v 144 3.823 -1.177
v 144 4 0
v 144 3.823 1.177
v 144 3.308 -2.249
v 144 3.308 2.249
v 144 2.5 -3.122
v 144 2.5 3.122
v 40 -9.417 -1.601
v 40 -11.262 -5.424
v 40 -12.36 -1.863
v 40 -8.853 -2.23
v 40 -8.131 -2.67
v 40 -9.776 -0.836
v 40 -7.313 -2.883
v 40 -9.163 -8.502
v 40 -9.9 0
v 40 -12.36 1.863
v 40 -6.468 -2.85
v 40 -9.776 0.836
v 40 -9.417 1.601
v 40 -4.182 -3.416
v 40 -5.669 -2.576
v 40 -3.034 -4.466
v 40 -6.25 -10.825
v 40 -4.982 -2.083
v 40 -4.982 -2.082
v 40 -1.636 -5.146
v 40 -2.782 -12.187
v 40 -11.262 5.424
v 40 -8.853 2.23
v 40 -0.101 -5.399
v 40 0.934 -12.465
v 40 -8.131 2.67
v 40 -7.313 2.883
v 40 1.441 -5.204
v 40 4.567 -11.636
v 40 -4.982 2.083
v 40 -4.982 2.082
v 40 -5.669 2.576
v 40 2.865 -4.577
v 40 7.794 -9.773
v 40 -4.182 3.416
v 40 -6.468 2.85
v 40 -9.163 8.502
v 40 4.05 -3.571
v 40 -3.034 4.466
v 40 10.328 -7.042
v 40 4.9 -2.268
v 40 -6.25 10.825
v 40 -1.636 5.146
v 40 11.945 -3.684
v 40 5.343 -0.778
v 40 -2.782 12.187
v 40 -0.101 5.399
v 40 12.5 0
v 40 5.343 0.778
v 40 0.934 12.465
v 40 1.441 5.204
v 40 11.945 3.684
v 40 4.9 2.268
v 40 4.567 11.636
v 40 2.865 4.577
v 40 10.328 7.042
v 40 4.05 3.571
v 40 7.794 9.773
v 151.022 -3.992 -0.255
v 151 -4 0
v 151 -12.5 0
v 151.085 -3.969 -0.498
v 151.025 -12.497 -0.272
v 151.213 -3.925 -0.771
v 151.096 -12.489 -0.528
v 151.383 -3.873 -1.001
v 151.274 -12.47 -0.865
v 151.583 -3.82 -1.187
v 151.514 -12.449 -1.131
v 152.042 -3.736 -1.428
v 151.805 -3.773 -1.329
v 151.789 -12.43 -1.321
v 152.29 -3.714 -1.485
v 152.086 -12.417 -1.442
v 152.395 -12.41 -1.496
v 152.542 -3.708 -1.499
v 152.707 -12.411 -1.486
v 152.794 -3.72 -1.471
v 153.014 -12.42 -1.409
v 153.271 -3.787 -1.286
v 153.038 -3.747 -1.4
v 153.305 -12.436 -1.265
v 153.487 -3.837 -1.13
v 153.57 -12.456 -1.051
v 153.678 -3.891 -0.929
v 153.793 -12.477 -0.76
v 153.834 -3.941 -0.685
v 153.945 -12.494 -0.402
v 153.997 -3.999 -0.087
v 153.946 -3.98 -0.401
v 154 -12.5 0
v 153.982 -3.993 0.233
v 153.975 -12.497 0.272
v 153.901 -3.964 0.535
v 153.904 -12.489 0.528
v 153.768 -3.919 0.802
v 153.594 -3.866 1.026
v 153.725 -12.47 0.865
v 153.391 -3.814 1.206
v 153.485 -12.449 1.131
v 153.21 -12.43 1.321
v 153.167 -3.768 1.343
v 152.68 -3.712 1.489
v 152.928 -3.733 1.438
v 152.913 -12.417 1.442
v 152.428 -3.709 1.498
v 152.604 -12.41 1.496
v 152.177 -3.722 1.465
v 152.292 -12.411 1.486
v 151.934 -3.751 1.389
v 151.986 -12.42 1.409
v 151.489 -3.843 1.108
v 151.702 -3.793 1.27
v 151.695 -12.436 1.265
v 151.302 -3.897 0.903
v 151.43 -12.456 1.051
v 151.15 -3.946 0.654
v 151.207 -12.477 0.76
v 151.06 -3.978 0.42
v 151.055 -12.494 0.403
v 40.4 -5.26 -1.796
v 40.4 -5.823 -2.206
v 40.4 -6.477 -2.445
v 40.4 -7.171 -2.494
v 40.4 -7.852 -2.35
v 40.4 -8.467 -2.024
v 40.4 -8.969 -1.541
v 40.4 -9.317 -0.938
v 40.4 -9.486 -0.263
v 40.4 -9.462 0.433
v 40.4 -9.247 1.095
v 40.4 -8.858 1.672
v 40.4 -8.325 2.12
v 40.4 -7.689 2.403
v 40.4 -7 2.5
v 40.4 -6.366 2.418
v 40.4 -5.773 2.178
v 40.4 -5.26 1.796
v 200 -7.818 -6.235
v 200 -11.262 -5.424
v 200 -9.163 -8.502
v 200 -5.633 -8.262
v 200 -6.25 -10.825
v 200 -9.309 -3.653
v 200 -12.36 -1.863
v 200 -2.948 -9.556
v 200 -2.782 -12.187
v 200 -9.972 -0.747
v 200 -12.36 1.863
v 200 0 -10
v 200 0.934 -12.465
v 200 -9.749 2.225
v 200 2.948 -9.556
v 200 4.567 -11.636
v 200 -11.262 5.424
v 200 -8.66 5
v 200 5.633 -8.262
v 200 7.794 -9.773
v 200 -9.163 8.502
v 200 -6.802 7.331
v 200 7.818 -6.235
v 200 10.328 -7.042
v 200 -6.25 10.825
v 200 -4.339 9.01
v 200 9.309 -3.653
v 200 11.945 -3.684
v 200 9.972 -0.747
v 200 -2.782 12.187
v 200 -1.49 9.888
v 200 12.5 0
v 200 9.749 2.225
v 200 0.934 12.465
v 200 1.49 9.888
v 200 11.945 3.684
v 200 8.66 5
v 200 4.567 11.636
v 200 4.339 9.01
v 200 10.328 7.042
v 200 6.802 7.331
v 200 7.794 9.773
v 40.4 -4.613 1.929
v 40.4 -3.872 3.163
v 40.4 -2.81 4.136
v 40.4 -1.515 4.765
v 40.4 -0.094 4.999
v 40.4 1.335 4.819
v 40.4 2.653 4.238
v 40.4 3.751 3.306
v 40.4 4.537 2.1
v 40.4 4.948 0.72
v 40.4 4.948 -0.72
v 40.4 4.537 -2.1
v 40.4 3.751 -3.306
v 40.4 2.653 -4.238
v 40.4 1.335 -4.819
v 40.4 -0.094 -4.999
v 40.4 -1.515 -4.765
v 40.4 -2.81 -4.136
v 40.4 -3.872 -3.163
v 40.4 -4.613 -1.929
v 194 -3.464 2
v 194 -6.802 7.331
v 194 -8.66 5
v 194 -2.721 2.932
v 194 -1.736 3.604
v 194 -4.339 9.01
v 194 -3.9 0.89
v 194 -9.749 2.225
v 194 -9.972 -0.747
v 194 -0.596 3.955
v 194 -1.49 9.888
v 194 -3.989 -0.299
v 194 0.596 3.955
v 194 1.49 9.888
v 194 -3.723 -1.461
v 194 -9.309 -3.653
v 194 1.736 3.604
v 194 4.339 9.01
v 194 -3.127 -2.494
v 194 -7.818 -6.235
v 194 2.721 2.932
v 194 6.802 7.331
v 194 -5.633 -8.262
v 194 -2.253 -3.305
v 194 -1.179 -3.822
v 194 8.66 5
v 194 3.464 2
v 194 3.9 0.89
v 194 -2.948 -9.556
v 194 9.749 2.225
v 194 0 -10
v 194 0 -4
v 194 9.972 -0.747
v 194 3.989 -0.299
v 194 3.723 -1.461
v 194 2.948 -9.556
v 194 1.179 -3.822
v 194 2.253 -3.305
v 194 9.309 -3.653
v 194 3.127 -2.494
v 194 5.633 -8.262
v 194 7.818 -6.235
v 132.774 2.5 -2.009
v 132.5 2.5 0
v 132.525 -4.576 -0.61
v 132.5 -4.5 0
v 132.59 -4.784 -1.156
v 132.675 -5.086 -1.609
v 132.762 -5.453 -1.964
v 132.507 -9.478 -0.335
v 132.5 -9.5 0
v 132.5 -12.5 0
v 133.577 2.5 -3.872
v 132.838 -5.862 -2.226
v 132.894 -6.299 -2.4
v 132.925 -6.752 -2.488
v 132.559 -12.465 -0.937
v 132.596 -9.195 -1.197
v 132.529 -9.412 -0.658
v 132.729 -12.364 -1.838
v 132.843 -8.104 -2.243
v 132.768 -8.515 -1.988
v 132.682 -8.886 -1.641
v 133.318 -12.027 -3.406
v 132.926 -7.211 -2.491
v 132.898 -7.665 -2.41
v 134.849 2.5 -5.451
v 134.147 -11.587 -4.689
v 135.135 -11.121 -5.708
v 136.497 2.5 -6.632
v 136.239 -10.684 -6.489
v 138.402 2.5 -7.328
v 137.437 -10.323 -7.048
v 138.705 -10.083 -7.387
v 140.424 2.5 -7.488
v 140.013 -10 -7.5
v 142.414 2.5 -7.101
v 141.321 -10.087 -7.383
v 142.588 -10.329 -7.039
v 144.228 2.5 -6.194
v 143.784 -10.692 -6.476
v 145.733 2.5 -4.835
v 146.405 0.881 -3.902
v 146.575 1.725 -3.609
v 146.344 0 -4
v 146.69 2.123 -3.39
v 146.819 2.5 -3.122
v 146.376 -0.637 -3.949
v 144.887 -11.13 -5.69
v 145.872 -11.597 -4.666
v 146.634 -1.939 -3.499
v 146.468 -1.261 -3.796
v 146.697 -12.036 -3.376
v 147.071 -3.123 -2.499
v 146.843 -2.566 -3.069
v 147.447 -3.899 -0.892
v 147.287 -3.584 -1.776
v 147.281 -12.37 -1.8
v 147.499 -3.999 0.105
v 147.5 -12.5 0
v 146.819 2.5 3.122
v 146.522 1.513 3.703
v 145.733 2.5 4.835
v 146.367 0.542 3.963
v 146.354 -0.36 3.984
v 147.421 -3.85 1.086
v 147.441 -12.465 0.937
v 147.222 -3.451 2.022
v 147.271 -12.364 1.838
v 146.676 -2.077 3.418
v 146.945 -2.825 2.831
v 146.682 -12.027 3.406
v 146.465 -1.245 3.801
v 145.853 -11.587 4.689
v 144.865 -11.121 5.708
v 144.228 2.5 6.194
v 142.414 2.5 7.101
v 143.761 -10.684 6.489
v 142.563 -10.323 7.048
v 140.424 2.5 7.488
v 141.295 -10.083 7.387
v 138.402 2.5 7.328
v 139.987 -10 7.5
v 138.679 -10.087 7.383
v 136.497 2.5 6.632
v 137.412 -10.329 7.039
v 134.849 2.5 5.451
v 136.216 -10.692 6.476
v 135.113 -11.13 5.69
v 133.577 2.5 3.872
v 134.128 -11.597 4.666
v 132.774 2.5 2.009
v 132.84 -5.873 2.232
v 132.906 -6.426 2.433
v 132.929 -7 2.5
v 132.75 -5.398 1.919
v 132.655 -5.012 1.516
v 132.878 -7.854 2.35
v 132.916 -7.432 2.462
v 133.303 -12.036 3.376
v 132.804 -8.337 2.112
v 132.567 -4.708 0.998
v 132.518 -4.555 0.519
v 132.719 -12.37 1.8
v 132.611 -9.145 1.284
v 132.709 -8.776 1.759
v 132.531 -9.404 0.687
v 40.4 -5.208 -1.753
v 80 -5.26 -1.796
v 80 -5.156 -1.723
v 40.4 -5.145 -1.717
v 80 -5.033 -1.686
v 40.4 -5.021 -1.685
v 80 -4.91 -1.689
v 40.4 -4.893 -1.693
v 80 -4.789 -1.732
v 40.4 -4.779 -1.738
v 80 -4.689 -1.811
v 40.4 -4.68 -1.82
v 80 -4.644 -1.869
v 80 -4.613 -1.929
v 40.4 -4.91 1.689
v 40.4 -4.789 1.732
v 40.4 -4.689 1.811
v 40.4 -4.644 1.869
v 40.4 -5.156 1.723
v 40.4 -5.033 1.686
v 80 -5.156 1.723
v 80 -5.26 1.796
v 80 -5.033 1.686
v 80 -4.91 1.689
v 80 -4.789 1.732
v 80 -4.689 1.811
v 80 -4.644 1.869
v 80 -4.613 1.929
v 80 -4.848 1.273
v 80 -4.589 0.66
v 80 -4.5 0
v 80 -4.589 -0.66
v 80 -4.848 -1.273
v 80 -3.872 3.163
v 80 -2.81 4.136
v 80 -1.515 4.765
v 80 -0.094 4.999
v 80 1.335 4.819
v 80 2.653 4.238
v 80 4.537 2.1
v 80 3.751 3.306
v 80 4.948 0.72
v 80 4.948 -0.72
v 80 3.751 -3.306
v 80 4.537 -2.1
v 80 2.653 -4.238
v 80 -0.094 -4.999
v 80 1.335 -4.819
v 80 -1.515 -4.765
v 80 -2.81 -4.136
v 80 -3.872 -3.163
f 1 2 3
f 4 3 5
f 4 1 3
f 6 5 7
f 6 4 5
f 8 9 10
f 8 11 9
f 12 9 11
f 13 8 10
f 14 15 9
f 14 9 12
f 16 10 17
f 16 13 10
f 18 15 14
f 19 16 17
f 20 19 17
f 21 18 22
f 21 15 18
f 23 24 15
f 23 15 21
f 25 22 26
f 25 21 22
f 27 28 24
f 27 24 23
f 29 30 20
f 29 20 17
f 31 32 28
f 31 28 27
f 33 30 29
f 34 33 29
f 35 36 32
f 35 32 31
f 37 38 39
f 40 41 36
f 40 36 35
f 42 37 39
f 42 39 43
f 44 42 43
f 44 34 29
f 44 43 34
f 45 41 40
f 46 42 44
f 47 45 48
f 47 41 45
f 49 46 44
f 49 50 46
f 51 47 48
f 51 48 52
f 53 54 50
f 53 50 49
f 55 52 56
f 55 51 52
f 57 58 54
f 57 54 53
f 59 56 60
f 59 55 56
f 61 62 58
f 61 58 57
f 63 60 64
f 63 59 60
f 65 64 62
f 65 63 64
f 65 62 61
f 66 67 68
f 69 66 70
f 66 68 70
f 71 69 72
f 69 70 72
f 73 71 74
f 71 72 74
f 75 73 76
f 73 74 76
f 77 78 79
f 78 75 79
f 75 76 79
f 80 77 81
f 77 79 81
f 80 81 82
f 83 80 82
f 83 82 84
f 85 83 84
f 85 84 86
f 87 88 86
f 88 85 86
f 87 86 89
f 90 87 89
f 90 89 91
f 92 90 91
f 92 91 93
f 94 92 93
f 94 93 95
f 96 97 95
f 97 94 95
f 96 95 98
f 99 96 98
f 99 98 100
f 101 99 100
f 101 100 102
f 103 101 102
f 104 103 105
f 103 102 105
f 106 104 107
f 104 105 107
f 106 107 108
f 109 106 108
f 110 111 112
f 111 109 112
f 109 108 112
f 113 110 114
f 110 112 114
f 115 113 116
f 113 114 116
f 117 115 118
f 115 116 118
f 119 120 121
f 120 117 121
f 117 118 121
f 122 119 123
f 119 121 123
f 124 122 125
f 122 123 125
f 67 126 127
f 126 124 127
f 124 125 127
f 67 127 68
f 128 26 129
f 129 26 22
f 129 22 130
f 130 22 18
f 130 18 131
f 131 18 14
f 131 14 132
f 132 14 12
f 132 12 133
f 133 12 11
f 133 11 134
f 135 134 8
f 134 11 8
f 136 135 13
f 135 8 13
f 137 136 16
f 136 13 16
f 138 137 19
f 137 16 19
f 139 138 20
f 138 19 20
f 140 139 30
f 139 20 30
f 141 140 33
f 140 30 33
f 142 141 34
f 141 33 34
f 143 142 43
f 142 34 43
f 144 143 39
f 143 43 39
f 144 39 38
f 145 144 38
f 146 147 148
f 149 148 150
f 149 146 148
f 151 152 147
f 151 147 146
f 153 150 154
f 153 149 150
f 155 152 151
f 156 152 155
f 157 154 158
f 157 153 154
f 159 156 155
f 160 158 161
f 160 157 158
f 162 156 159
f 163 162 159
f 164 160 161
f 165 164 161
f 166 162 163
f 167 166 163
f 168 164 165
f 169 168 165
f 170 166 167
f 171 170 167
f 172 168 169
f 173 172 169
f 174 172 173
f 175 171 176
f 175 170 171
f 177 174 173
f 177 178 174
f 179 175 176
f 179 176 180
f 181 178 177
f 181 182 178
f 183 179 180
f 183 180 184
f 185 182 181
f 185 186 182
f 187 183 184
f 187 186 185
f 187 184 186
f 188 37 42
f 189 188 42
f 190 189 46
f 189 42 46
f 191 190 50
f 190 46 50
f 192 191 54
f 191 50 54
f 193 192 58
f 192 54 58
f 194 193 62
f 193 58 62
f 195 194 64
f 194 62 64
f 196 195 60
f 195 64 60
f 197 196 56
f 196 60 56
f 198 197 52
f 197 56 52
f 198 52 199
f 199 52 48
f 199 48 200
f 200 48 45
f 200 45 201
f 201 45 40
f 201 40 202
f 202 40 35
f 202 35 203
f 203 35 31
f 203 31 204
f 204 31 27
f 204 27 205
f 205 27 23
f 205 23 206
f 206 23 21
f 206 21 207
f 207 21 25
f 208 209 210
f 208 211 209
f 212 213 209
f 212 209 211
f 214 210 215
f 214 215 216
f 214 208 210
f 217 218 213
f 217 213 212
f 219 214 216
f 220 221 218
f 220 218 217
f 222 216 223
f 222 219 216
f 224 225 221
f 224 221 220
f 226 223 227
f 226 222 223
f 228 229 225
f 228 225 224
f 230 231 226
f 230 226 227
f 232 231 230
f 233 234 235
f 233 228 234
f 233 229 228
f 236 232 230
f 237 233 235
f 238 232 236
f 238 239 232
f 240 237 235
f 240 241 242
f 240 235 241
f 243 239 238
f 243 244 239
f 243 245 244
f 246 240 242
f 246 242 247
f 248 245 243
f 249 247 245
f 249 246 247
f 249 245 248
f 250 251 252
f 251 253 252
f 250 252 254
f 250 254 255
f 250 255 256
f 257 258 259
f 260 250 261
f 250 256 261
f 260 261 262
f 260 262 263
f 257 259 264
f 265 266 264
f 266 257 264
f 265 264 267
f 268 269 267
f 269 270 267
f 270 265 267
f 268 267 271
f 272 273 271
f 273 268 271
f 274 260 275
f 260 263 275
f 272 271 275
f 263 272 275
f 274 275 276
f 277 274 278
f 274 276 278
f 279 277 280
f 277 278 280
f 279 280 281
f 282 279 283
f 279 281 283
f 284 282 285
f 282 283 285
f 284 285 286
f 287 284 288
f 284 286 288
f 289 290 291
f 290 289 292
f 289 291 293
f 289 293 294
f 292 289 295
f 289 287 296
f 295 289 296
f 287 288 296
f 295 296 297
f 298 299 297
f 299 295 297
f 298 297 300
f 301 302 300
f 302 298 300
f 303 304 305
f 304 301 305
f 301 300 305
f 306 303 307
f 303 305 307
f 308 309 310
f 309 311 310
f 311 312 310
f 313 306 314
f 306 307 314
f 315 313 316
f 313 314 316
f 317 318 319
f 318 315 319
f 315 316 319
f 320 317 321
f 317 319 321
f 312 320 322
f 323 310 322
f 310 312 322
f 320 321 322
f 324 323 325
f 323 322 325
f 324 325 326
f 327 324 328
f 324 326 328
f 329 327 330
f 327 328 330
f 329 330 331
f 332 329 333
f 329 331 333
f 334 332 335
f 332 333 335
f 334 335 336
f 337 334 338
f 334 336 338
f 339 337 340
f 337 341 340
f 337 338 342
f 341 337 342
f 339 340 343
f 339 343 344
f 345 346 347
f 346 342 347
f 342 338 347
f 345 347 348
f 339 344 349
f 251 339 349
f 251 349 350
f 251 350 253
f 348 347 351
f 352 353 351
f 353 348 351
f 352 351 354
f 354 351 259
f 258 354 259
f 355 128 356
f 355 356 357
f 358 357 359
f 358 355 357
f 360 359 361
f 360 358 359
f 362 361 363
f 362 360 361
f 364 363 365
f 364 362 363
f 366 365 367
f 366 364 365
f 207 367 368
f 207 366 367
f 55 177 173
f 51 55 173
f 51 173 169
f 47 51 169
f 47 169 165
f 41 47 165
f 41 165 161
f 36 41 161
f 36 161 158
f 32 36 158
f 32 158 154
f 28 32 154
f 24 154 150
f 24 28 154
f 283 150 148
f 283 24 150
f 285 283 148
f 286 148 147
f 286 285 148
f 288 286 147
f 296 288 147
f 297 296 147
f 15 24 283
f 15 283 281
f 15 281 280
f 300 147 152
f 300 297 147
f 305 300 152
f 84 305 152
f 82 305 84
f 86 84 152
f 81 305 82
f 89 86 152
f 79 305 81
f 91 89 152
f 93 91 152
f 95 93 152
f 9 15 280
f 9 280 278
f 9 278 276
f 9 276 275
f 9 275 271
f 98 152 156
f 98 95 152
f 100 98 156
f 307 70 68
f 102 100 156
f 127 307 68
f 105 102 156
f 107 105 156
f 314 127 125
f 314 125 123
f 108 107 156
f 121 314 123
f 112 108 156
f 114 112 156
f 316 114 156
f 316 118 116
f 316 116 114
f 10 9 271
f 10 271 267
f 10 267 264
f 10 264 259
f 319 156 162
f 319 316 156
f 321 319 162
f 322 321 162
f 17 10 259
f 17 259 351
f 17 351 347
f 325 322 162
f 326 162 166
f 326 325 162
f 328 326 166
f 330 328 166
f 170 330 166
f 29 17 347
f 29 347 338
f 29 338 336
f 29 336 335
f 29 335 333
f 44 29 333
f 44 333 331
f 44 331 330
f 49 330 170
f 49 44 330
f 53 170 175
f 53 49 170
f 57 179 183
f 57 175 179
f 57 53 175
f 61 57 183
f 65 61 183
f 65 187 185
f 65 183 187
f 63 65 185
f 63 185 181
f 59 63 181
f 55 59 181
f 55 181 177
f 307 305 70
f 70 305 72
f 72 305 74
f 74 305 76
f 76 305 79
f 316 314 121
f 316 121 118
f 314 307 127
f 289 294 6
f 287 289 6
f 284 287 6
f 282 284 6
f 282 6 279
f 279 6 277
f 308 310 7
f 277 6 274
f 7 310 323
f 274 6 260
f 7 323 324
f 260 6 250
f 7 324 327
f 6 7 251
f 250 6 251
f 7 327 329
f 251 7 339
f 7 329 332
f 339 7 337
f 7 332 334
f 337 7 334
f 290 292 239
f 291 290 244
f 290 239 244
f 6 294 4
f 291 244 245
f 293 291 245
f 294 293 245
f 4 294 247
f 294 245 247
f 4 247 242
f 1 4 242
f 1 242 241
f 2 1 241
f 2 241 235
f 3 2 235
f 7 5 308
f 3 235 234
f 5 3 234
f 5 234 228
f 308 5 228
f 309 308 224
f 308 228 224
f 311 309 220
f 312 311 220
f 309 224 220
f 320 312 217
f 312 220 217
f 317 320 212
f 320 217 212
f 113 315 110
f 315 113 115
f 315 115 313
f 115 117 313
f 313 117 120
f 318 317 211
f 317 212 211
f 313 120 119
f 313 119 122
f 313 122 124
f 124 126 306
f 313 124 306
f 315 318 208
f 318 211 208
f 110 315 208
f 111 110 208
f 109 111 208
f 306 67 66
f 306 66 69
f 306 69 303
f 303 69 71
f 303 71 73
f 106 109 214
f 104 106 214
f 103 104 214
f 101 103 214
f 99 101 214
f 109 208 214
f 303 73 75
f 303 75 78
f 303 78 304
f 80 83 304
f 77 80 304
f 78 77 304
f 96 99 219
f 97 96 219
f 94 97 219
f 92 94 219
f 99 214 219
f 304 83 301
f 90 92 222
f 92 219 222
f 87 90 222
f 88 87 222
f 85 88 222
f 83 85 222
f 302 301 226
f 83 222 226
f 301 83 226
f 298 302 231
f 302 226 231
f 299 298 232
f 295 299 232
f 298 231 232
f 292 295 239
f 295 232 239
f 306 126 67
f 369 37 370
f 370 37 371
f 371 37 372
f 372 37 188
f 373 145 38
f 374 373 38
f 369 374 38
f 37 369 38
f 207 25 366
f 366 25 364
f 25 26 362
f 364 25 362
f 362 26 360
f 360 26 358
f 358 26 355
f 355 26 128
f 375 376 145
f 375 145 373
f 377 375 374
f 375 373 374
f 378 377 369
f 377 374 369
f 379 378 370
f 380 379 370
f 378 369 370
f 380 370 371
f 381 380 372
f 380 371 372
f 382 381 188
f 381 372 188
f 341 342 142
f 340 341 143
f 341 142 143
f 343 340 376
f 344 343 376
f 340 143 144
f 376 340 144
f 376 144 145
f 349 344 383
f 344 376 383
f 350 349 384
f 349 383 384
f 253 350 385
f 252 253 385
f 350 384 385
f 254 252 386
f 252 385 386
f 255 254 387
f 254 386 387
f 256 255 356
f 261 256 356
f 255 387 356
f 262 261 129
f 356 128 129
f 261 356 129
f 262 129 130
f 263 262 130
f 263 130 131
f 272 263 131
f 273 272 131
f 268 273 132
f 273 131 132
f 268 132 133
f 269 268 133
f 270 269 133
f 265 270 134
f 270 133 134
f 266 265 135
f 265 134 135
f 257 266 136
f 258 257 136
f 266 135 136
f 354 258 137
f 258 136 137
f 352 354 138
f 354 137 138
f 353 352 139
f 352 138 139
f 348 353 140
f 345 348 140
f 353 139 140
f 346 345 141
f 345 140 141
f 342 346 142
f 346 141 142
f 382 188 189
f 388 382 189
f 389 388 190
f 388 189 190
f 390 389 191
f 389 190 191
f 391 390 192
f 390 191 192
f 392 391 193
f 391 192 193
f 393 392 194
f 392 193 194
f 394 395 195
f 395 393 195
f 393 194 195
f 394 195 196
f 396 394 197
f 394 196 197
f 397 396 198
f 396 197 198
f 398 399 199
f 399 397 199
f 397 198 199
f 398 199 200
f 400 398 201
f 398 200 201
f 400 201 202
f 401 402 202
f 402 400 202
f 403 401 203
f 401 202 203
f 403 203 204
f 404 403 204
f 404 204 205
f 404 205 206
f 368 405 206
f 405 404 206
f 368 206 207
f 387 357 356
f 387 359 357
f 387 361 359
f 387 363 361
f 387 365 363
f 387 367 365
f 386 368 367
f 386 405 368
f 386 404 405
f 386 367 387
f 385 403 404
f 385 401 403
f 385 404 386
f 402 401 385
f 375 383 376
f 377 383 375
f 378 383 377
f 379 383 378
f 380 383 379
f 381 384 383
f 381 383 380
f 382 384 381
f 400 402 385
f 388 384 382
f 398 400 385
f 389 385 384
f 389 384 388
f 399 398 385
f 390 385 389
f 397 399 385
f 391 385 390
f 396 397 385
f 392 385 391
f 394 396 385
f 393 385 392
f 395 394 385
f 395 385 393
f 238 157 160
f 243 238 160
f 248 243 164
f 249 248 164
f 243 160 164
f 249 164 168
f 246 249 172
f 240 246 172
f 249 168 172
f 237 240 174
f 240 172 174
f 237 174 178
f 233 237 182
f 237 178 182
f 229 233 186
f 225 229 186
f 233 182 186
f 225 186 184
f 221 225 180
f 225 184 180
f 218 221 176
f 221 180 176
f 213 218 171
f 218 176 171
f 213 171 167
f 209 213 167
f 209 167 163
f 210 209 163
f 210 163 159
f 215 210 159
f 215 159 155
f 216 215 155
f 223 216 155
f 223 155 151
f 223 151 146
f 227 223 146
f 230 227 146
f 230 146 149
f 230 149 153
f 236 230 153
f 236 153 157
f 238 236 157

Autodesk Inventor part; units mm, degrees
ref_plane "YZ Plane" through (0, 0, 0) normal (1, 0, 0) x (0, 1, 0)
sketch "Sketch1" plane through (0, 0, 0) normal (1, 0, 0) x (0, 1, 0)
  circle A0 centre (0, 0) radius 12.5
  dimension "d0" = 25
extrude "Extrusion1" add sketch "Sketch1" along normal blind 200
ref_plane "Work Plane1" through (0, -12.5, 0) normal (0, 1, 0) x (-1, 0, 0)
sketch "Sketch2" plane through (0, -12.5, 0) normal (0, 1, 0) x (-1, 0, 0)
  line L0 (-200, 12.5) -> (-200, -12.5) projected
  line L1 (-200, 0) -> (-140, 0)
  circle A0 centre (-140, 0) radius 7.5
  point P0 (0, 0)
  dimension "d19" = 60
  dimension "d20" = 15
extrude "Extrusion2" cut sketch "Sketch2" along normal blind 15
sketch "Sketch3" plane through (0, 0, 0) normal (-1, 0, 0) x (0, 0, 1)
  line L0 (0, 0) -> (0, -7)
  circle A0 centre (0, -7) radius 2.5
  dimension "d9" = 7
  dimension "d10" = 5
extrude "Extrusion3" cut sketch "Sketch3" against normal blind 136
sketch "Sketch4" plane through (200, 0, 0) normal (1, 0, 0) x (0, 0, -1)
  circle A0 centre (0, 0) radius 10
  dimension "d13" = 20
extrude "Extrusion4" cut sketch "Sketch4" against normal blind 6
sketch "Sketch5" plane through (194, 0, 0) normal (1, 0, 0) x (0, 0, -1)
  circle A0 centre (0, 0) radius 4
  dimension "d16" = 8
extrude "Extrusion5" cut sketch "Sketch5" against normal blind 50
sketch "Sketch6" plane through (0, 0, 0) normal (-1, 0, 0) x (0, 0, 1)
  circle A0 centre (0, 0) radius 5
  dimension "d21" = 10
extrude "Extrusion6" cut sketch "Sketch6" against normal blind 80
fillet "Fillet1" radius 0.4 2 edges at (40, -4.8393, 1.2575) (40, -4.8393, -1.2575)
sketch "Sketch7" plane through (0, 0, 0) normal (-1, 0, 0) x (0, 0, 1)
  circle A0 centre (0, 0) radius 38.5321
extrude "Extrusion7" cut sketch "Sketch7" against normal blind 40
chamfer "Chamfer1" distance 0.4 angle 45 5 edges at (40, 5, 0) (40, -4.9016, 1.691) (40, -4.9016, -1.691) (40, -6.0616, 2.3172) (40, -9.3172, -0.9384)
ref_plane "Work Plane2" through (0, -12.5, 0) normal (0, 1, 0) x (-1, 0, 0)
sketch "Sketch8" plane through (0, -12.5, 0) normal (0, 1, 0) x (-1, 0, 0)
  circle A0 centre (-152.5, 0) radius 1.5
  line L0 (-200, 12.5) -> (-200, -12.5) projected
  point P0 (0, 0)
  dimension "d31" = 3
  dimension "d32" = 47.5
extrude "Extrusion8" cut sketch "Sketch8" along normal blind 10
properties part number "Dowel1"
